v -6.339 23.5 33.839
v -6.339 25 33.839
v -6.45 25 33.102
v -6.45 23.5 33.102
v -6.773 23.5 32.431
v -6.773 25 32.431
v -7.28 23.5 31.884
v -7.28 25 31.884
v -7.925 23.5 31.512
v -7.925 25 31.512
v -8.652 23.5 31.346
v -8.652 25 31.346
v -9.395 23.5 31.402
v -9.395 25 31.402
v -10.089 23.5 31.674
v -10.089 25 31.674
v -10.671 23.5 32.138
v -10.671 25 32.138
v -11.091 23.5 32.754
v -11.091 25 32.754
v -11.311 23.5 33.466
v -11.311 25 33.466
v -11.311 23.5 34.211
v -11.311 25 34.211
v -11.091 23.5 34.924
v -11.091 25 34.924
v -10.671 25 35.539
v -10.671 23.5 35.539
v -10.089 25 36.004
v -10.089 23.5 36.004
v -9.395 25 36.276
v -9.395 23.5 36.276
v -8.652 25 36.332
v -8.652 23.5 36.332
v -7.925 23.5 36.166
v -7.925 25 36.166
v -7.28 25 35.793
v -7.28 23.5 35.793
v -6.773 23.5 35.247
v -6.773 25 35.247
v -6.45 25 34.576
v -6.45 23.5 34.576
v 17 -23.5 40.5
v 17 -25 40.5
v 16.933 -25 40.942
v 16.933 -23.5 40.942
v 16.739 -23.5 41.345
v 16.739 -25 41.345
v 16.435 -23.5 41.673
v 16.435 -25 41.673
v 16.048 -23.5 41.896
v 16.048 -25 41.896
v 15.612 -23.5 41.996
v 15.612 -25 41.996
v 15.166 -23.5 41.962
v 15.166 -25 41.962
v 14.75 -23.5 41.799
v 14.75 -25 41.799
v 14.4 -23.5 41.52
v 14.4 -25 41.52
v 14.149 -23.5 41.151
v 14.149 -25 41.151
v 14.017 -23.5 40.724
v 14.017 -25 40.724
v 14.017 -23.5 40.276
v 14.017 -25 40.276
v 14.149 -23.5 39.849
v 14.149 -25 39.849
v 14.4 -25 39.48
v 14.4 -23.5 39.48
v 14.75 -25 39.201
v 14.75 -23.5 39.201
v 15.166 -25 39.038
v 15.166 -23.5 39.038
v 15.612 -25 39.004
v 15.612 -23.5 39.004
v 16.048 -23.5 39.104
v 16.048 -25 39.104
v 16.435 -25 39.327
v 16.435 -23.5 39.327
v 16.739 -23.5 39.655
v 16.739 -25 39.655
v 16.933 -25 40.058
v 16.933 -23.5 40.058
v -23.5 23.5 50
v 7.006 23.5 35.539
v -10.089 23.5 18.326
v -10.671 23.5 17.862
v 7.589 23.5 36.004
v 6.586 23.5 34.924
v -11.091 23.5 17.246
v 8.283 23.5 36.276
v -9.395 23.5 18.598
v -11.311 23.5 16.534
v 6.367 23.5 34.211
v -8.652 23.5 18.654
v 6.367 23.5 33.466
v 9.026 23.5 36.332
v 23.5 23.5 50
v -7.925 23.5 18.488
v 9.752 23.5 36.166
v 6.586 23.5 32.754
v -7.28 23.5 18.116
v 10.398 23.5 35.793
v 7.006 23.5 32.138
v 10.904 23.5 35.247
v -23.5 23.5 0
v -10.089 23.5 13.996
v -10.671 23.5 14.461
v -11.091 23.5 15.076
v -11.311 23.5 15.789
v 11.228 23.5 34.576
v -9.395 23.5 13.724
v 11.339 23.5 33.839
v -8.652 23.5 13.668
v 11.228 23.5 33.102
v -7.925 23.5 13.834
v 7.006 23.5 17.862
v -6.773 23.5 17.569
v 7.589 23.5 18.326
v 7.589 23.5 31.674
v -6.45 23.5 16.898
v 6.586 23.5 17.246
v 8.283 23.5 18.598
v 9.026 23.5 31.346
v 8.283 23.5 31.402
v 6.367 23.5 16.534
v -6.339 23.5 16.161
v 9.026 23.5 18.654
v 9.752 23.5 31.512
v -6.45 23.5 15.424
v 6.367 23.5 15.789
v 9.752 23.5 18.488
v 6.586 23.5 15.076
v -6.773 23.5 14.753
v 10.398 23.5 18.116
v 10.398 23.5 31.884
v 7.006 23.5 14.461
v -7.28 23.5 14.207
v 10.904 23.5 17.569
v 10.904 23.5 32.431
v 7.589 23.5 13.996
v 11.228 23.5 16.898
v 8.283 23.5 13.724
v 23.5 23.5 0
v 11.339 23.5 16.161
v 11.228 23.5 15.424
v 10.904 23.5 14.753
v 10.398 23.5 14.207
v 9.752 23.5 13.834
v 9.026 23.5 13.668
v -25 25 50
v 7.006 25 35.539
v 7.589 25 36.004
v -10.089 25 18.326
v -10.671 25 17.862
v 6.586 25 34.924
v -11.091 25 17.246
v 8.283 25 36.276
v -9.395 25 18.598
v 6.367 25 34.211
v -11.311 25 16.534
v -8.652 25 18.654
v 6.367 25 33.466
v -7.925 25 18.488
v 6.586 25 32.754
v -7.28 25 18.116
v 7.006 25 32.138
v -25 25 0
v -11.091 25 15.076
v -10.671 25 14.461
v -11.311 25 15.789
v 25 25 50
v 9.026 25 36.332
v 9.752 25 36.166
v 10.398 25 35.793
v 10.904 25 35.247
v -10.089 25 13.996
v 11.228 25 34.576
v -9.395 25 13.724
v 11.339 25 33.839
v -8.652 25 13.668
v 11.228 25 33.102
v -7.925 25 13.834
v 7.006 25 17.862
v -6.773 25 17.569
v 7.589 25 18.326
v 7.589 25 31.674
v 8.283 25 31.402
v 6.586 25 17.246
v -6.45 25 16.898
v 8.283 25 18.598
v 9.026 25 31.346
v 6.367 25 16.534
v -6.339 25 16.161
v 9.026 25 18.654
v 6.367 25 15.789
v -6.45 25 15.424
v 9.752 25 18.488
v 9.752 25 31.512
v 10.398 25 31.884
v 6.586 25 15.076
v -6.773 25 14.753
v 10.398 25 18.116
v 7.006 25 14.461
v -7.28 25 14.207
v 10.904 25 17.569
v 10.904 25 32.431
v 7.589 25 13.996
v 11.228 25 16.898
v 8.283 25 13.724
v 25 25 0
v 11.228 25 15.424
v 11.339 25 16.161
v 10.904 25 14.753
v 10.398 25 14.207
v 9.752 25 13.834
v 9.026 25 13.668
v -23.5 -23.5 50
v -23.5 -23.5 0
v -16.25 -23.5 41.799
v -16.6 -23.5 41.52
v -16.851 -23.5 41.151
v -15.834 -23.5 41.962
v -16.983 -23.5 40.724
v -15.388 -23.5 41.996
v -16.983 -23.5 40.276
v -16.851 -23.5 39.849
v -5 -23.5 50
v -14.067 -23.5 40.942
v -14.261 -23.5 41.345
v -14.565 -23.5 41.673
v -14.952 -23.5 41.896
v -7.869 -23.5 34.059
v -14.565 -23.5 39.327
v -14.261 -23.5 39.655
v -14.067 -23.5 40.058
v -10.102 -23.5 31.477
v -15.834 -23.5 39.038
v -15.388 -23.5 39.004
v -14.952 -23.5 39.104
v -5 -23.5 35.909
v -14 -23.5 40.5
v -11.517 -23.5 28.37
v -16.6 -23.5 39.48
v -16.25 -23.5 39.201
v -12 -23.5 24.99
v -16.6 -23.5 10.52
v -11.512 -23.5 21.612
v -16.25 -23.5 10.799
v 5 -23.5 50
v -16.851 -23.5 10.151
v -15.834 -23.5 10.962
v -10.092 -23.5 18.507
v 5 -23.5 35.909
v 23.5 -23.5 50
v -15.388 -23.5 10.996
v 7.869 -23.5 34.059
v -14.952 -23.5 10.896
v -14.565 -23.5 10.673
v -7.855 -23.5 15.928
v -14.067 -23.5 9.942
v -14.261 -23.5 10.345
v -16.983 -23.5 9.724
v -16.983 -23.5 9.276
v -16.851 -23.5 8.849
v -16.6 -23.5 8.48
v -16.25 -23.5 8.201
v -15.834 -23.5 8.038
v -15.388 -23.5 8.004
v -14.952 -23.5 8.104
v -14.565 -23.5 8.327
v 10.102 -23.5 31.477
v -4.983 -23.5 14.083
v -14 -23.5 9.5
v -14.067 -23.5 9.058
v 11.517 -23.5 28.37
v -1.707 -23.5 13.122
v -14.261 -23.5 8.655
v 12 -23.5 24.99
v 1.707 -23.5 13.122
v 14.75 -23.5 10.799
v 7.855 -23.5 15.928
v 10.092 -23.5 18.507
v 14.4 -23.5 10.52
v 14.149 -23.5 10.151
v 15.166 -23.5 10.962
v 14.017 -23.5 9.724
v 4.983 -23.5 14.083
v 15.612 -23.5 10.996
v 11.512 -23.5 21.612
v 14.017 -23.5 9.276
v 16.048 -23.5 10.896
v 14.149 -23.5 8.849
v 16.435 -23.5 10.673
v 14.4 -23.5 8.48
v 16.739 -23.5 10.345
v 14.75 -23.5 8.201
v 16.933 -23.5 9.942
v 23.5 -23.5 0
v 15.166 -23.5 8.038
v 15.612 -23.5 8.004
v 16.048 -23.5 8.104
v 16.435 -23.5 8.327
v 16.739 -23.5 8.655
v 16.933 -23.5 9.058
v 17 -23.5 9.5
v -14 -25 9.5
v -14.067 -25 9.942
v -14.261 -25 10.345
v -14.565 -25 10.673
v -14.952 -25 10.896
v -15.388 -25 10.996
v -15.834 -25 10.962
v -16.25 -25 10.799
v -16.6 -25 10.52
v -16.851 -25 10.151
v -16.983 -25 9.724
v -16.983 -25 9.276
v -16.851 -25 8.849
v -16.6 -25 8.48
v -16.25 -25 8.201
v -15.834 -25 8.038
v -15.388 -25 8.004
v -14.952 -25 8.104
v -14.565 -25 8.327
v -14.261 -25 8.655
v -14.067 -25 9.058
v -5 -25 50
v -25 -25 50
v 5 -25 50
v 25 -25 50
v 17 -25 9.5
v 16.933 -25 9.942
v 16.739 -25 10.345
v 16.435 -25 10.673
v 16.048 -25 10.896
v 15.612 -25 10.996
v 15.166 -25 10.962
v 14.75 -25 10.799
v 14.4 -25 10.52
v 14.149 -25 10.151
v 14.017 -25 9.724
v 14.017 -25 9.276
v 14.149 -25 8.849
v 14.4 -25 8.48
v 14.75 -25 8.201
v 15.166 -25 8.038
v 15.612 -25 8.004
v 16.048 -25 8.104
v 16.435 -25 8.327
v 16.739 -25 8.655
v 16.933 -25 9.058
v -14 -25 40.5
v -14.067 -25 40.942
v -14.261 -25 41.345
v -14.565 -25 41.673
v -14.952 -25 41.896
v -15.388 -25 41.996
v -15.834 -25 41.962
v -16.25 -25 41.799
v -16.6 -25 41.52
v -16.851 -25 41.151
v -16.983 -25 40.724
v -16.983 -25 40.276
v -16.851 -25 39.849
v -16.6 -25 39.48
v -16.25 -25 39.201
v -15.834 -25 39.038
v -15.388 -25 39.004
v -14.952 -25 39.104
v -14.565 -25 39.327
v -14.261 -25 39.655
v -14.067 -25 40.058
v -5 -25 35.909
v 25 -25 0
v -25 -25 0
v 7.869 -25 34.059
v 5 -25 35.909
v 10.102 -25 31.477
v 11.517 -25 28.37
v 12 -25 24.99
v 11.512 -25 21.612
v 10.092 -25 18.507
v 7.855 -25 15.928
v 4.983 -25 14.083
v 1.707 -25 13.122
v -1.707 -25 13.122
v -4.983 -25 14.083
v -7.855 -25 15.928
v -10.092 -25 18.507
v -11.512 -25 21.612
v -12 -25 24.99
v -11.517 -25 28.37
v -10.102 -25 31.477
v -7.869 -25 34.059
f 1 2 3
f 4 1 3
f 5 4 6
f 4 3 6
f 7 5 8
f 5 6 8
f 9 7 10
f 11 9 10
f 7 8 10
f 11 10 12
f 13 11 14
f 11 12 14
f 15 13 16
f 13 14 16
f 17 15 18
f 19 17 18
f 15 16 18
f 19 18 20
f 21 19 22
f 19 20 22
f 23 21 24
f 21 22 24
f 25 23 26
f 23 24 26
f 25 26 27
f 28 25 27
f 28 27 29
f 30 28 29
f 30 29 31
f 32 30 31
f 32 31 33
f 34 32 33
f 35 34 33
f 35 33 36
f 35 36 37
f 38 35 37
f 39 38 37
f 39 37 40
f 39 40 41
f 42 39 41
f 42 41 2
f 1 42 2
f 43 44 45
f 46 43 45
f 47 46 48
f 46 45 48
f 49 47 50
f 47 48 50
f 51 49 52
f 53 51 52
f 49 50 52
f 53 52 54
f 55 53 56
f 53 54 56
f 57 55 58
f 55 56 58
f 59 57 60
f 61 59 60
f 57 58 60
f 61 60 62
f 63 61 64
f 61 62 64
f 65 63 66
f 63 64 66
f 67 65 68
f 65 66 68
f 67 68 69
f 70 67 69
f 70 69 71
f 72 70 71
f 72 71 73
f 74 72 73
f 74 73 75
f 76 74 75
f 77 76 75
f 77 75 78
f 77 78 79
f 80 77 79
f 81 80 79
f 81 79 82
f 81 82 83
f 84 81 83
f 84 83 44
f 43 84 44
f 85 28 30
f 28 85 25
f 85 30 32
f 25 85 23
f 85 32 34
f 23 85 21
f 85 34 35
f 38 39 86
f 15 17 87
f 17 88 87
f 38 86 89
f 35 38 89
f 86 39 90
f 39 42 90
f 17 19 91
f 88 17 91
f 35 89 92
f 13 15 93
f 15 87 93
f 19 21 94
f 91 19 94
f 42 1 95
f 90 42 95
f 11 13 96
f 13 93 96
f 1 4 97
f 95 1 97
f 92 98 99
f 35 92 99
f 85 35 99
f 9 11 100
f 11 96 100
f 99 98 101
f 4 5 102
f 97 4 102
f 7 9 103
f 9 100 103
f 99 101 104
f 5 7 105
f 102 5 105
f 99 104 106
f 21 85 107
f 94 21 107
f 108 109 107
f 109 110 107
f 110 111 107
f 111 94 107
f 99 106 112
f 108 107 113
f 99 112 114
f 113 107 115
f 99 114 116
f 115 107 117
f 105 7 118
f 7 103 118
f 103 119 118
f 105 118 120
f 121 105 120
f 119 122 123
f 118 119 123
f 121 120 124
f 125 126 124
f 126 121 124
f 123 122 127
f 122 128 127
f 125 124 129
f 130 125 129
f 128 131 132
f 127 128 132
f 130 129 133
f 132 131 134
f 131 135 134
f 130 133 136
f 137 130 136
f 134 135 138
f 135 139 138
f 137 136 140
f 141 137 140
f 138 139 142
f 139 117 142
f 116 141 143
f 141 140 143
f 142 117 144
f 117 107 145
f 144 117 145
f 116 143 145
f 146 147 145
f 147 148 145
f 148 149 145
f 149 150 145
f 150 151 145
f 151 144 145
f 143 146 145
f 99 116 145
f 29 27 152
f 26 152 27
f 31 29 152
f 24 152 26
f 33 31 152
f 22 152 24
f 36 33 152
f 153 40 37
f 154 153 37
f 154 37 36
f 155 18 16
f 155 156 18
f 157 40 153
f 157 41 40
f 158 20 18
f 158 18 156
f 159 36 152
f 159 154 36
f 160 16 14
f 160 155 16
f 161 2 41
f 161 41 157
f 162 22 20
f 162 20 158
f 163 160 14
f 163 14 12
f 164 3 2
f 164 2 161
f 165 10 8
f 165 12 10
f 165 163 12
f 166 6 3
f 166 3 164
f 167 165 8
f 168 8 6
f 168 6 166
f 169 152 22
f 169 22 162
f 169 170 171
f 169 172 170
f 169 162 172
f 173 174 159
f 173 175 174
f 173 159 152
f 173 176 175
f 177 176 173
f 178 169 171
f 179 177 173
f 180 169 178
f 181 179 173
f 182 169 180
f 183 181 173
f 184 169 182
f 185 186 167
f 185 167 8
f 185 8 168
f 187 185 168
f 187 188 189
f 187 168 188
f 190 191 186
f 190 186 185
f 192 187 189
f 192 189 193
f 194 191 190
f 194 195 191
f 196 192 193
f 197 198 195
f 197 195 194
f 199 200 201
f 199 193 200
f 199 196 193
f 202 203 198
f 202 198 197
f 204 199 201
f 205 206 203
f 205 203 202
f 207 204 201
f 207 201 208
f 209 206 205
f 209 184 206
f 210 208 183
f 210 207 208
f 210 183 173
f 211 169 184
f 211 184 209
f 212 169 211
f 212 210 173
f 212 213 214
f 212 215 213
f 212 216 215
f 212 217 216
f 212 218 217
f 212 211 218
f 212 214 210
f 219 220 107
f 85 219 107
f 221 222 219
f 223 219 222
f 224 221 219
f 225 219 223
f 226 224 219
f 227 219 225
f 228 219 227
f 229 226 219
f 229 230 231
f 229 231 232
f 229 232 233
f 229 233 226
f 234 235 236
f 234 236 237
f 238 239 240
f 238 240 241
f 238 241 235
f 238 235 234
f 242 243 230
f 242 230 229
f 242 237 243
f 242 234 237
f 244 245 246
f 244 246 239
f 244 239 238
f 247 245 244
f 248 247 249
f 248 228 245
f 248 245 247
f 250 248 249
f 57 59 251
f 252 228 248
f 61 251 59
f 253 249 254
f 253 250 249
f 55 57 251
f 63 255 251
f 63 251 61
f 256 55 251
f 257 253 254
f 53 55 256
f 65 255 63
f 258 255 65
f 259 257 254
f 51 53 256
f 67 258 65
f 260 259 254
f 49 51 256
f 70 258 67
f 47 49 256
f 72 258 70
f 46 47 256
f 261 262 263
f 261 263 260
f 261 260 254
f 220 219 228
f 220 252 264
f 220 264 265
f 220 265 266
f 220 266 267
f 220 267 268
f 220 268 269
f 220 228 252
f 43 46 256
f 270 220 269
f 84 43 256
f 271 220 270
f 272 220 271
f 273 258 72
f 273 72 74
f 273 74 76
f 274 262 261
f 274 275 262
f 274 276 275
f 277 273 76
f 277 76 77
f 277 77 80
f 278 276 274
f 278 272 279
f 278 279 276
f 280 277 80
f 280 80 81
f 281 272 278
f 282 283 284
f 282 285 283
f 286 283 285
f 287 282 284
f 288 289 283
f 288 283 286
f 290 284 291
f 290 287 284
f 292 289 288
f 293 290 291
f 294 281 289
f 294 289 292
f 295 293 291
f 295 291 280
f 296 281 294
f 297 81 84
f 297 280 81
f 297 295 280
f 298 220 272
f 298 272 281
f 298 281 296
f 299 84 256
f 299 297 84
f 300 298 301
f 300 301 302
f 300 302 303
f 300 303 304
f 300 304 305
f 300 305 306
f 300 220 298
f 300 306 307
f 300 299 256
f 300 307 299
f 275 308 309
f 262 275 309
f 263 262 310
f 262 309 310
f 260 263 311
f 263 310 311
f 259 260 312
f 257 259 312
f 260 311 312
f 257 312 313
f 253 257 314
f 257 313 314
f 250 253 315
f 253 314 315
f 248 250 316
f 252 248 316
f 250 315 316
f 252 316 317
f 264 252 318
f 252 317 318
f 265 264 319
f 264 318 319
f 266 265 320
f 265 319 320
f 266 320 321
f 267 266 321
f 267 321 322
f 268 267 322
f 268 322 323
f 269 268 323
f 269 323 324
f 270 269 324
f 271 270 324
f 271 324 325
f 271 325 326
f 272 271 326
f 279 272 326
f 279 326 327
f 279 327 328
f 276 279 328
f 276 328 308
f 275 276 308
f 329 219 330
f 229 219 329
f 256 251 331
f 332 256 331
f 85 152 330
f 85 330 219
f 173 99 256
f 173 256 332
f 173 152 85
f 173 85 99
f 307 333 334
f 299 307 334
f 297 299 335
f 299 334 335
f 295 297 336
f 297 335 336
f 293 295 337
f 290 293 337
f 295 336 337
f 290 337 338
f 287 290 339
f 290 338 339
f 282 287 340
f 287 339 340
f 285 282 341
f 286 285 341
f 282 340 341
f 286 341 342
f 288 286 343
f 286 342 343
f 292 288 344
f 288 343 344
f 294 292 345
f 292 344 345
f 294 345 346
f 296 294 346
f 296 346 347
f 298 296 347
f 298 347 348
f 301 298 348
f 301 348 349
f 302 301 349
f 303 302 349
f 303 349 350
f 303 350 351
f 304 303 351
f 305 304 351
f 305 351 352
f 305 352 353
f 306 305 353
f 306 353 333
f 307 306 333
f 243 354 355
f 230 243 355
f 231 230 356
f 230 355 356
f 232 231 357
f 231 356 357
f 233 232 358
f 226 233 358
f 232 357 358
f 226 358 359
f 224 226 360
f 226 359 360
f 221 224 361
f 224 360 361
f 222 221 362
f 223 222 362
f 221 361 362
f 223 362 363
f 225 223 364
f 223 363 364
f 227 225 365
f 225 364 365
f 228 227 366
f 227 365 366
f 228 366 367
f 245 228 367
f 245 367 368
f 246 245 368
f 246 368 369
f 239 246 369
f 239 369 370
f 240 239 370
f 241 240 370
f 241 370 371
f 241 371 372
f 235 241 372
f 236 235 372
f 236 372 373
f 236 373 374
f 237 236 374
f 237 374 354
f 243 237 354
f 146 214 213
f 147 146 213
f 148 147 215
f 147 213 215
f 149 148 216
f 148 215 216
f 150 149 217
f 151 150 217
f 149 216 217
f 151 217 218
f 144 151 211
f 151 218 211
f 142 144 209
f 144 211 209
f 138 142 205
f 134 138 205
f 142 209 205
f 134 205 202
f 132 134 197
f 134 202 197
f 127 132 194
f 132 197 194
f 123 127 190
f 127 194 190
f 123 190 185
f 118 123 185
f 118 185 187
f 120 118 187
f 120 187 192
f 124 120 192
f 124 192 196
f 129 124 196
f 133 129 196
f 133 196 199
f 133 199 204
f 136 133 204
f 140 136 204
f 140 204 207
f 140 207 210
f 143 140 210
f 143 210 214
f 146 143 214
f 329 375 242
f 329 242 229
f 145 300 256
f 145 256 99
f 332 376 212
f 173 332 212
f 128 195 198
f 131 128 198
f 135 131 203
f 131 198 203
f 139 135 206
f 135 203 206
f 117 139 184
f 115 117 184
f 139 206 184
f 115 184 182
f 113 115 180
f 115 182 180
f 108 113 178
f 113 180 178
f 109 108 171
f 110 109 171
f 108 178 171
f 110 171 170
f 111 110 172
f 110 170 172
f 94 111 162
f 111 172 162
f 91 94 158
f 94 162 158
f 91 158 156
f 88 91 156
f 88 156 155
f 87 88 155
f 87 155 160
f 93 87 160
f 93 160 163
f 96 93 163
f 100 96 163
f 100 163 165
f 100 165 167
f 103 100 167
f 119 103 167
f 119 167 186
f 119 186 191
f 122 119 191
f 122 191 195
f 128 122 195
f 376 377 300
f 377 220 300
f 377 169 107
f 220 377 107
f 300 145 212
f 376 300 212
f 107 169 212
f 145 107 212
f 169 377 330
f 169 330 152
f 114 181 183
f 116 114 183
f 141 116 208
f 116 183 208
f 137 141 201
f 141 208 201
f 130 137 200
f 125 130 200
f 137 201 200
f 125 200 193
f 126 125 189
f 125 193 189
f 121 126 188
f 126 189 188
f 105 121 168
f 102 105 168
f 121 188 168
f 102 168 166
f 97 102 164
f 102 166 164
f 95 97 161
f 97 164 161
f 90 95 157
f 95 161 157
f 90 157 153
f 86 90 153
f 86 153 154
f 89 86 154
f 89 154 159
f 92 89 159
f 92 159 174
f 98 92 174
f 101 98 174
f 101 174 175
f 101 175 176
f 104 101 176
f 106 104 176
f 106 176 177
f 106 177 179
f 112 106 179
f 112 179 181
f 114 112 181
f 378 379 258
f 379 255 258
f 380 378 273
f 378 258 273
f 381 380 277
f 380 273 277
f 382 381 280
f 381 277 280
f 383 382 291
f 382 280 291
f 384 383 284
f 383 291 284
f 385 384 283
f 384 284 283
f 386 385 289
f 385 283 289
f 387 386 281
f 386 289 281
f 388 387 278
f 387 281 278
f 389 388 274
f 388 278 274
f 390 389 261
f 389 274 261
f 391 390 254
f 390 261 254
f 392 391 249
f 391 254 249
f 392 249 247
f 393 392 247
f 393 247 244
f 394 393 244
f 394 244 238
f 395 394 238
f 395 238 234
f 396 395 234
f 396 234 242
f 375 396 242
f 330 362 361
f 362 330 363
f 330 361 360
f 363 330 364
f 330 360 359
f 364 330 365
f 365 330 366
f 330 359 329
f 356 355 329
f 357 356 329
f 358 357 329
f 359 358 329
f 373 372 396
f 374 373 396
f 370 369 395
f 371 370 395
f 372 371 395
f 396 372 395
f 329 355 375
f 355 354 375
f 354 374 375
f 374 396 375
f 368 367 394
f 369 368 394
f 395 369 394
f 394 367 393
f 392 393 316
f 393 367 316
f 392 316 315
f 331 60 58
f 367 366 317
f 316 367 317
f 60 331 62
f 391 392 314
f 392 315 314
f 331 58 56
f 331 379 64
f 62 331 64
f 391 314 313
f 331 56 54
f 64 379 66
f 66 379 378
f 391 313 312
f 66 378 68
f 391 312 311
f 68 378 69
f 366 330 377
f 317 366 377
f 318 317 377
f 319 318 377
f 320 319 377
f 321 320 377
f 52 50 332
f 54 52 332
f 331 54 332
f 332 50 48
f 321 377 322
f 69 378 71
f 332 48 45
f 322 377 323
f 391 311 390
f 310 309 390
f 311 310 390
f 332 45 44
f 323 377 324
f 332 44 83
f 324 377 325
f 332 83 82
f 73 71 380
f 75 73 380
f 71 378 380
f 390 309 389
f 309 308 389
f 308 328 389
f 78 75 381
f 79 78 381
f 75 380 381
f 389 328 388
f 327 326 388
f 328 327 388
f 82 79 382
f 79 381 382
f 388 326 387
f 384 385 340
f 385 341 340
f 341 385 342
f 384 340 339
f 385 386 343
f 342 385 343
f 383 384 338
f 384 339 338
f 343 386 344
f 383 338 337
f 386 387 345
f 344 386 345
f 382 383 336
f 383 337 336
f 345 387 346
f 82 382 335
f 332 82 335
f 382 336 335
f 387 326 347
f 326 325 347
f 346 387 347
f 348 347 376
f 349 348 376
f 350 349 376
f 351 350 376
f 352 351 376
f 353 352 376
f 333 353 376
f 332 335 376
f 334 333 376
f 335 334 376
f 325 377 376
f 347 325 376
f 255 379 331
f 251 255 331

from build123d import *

# Parameters (mm, degrees)
ESBO_O1_W                = 50
ESBO_O1_H                = 50
ESBO_O1_W_2              = 47
ESBO_O1_H_2              = 47
RESSALTO_EXTRUS_O1_DEPTH = 50
ESBO_O2_R                = 2.5
CORTE_EXTRUS_O2_DEPTH    = 10
ESBO_O3_R                = 12
CORTE_EXTRUS_O3_DEPTH    = 10
ESBO_O4_R                = 1.5
CORTE_EXTRUS_O5_DEPTH    = 10
ESBO_O5_W                = 10
ESBO_O5_H                = 36.830257898
CORTE_EXTRUS_O6_DEPTH    = 10


with BuildPart() as part:
    # Esboço1 → Ressalto-extrusão1 (new body)
    with BuildSketch(Plane.XY):
        Rectangle(ESBO_O1_W, ESBO_O1_H)
        Rectangle(ESBO_O1_W_2, ESBO_O1_H_2, mode=Mode.SUBTRACT)
    extrude(amount=RESSALTO_EXTRUS_O1_DEPTH)

    # Esboço2 → Corte-extrusão2 (cut)
    with BuildSketch(Plane(origin=(0, 25, 0), x_dir=(1, 0, 0), z_dir=(0, 1, 0))):
        with Locations((-8.838834765, -16.161165235)):
            Circle(ESBO_O2_R)
        with Locations((8.838834765, -16.161165235)):
            Circle(ESBO_O2_R)
        with Locations((-8.838834765, -33.838834765)):
            Circle(ESBO_O2_R)
        with Locations((8.838834765, -33.838834765)):
            Circle(ESBO_O2_R)
    extrude(amount=-CORTE_EXTRUS_O2_DEPTH, mode=Mode.SUBTRACT)

    # Esboço3 → Corte-extrusão3 (cut)
    with BuildSketch(Plane(origin=(0, -23.5, 0), x_dir=(1, 0, 0), z_dir=(0, 1, 0))):
        with Locations((0, -25)):
            Circle(ESBO_O3_R)
    extrude(amount=-CORTE_EXTRUS_O3_DEPTH, mode=Mode.SUBTRACT)

    # Esboço4 → Corte-extrusão5 (cut)
    with BuildSketch(Plane.XZ.offset(25)):
        with Locations((15.5, 40.5)):
            Circle(ESBO_O4_R)
        with Locations((15.5, 9.5)):
            Circle(ESBO_O4_R)
        with Locations((-15.5, 40.5)):
            Circle(ESBO_O4_R)
        with Locations((-15.5, 9.5)):
            Circle(ESBO_O4_R)
    extrude(amount=-CORTE_EXTRUS_O5_DEPTH, mode=Mode.SUBTRACT)

    # Esboço5 → Corte-extrusão6 (cut)
    with BuildSketch(Plane.XZ.offset(25)):
        with Locations((0, 50)):
            Rectangle(ESBO_O5_W, ESBO_O5_H)
    extrude(amount=-CORTE_EXTRUS_O6_DEPTH, mode=Mode.SUBTRACT)


solid = part.part
